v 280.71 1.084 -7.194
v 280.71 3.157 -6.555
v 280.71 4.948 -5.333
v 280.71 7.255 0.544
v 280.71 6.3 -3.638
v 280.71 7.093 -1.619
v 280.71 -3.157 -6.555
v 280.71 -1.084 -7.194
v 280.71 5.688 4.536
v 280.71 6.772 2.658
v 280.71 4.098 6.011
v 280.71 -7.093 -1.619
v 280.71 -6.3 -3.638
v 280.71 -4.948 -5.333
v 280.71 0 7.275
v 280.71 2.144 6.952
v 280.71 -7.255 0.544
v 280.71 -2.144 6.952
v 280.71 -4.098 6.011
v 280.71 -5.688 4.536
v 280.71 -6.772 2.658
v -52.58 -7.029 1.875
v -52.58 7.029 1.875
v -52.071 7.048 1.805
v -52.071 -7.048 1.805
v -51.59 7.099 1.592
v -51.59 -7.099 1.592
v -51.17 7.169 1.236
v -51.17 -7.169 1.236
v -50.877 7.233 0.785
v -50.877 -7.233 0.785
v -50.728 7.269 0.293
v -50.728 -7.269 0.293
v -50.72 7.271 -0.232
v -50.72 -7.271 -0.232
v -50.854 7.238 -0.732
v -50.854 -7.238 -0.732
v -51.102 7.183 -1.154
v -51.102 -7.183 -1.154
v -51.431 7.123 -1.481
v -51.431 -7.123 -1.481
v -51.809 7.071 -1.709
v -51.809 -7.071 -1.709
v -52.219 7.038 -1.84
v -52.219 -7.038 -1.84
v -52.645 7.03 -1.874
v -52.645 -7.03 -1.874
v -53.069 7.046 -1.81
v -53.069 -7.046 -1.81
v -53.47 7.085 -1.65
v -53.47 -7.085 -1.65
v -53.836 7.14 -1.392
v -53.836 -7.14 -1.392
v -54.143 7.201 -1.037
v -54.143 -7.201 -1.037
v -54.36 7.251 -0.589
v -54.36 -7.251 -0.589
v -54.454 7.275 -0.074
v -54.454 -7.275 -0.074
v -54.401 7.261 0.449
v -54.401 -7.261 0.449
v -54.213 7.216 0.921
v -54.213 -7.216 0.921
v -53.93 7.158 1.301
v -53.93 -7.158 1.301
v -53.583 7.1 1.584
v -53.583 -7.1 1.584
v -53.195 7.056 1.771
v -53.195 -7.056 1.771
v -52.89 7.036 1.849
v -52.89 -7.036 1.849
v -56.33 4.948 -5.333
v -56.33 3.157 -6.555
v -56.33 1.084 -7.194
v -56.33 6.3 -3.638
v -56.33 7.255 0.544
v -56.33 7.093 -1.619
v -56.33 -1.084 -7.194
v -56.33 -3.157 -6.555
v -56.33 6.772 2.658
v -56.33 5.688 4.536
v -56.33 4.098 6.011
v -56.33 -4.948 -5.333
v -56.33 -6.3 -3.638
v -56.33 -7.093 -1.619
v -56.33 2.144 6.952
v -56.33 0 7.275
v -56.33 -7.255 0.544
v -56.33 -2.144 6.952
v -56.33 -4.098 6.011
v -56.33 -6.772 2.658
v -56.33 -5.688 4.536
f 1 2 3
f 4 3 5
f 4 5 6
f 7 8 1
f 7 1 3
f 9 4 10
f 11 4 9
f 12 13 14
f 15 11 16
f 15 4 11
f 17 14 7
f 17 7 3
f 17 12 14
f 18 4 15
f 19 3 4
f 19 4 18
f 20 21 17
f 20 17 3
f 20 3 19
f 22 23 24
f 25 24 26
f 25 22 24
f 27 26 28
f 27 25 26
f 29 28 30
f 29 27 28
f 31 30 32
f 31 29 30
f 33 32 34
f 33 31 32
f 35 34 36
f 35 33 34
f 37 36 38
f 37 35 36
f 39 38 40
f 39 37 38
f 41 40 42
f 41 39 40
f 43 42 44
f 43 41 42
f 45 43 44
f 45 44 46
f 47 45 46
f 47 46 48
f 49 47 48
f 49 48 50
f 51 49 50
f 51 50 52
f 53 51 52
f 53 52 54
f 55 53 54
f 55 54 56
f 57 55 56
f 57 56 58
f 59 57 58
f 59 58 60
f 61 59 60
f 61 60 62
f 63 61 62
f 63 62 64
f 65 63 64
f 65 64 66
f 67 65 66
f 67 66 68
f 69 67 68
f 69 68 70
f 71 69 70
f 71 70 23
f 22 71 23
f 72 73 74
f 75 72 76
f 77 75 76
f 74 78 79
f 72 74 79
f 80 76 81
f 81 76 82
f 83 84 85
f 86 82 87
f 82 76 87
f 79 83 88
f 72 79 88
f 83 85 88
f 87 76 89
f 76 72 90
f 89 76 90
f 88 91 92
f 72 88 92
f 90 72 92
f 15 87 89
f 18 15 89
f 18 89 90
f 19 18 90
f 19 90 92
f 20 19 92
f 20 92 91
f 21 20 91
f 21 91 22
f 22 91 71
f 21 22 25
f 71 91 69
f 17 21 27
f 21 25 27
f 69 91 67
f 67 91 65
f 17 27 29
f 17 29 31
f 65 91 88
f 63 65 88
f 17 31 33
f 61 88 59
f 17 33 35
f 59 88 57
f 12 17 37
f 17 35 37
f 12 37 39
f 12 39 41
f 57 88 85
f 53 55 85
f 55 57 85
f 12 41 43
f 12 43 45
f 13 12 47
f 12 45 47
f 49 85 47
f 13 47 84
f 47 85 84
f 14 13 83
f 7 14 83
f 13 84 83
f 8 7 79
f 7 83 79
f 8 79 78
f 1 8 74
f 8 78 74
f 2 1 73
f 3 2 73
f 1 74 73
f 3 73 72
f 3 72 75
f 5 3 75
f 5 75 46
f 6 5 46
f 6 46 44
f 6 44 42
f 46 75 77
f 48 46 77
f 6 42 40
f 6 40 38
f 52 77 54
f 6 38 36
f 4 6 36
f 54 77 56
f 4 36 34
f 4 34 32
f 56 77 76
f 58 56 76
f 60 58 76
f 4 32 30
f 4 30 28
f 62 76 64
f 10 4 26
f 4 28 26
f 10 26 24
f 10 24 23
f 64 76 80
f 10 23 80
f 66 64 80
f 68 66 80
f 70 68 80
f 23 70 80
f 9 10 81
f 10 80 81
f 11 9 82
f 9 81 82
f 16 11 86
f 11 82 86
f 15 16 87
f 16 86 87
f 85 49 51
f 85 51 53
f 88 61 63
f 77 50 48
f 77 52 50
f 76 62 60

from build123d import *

# Parameters (mm, degrees)
SKETCH1_R               = 4.85
BOSS_EXTRUDE1_DEPTH     = 224.6937
CUT_EXTRUDE1_DEPTH      = 225.798362582
CUT_EXTRUDE1_DEPTH_BACK = 225.798362582
SKETCH2_R               = 1.25
SCALE1_SCALE            = 1.5


with BuildPart() as part:
    # Sketch1 → Boss-Extrude1 (new body)
    with BuildSketch(Plane(origin=(0, 0, 0), x_dir=(0, 0, -1), z_dir=(1, 0, 0))):
        with Locations(Location((0, 0, 0), (0, 0, 180))):
            Circle(SKETCH1_R)
    extrude(amount=BOSS_EXTRUDE1_DEPTH)

    # Sketch2 → Cut-Extrude1 (cut, two sides: drawn at the far end of the back side and taken through both)
    with BuildSketch(Plane(origin=(0, 0, 0), x_dir=(1, 0, 0), z_dir=(0, 1, 0)).offset(-CUT_EXTRUDE1_DEPTH_BACK)):
        with Locations(Location((2.5, 0, 0), (0, 0, 270))):
            Circle(SKETCH2_R)
    extrude(amount=CUT_EXTRUDE1_DEPTH + CUT_EXTRUDE1_DEPTH_BACK, mode=Mode.SUBTRACT)


with BuildPart() as part_1:
    # Scale1: scaled about (112.660192286, 0, 1.805e-06)
    add(part.part.scale(SCALE1_SCALE).moved(Location((-56.330096143, 0, -9.03e-07))))


solid = part_1.part
